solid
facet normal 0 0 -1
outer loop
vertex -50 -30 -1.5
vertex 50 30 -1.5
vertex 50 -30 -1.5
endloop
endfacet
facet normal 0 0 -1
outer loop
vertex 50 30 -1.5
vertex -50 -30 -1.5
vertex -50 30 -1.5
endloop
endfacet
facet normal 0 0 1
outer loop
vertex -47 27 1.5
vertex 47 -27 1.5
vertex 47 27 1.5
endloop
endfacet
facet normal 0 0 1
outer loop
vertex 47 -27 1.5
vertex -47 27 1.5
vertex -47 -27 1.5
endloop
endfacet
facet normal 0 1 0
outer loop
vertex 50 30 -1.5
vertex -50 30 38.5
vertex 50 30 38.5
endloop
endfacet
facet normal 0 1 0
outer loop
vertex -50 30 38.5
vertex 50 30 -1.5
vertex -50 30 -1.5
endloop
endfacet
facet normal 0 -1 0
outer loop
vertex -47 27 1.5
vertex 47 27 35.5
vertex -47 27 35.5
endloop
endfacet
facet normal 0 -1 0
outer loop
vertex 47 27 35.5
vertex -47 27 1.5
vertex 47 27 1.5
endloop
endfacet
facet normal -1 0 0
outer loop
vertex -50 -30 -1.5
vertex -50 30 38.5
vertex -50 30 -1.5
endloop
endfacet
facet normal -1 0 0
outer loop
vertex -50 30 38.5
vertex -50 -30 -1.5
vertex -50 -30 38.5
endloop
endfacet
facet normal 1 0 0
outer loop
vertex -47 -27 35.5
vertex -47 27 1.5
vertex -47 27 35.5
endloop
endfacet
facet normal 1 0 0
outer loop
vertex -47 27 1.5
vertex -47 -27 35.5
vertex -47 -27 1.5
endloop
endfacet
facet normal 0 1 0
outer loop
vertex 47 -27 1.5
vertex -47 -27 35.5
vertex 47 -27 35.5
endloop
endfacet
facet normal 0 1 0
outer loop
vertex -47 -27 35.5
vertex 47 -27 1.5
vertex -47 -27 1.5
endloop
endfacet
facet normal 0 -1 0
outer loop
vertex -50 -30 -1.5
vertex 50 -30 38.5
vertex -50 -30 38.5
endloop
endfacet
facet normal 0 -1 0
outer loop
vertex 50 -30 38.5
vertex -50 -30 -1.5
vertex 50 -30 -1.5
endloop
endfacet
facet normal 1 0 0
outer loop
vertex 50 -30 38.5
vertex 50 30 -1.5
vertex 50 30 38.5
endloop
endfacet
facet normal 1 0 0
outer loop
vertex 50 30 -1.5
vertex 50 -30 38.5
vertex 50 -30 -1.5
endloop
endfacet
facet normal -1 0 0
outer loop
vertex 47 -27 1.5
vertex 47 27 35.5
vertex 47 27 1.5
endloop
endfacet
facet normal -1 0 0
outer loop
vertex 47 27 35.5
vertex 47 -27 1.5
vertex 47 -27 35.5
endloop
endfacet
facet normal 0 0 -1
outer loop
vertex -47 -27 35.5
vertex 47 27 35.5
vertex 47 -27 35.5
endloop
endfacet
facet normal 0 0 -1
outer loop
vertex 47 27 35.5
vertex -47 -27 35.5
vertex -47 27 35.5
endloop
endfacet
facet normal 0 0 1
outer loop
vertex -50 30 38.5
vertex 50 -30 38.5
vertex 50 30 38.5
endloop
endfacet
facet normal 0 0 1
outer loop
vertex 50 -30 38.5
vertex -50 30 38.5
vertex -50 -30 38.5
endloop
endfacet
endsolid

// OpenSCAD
/*
  Box with fingerjoints - Based on earlier version of Finger Joint Box
  http://www.thingiverse.com/thing:448592
  Aaron Ciuffo
  24 December 2015 
*/


//include <../libraries/nuts_and_bolts.scad>
/* [Box Dimensions] */
// Box X dimension
customX = 100;
// Box Y dimension
customY = 60;
// Box Z dimension
customZ = 40;

// Finger & Cut width (sides, bottom) - must be < 1/3 shortest side
customFinger = 10;
// Finger & Cut wdith on lid only - must be < 1/3 shortest X or Y 
customLidFinger = 20;

/* [Layout Option] */
// layout 2D or 3D style - THINGIVERSE CANNOT OUTPUT 2D STLS!
customLayout2D = 0; // [0:3D layout for visualization, 1:2D layout for DXF output]

/* [Hidden] */
customSize = [customX, customY, customZ];
o = .001; // overage for cutting 


// cuts that fall completely inside the edge
module insideCuts(length, finger, cutD, uDiv) {
  numFinger = floor(uDiv/2);
  numCuts = ceil(uDiv/2);

  myCutD = cutD+o; // add an overage to make the cut complete
  // draw rectangles to make slots
  for (i=[0:numCuts-1]) {
    translate([i*finger*2, 0, 0])
      square([finger, myCutD]);
  }
}

module outsideCuts(length, finger, cutD, uDiv) {
  numFinger = ceil(uDiv/2);
  numCuts = floor(uDiv/2);

  myCutD = cutD+o; // add an overage in to make cuts slightly larger


  // calculate the length of the extra long cut at either end
  endCut = (length-uDiv*finger)/2;
  // amount of padding to add to the itterative placement of cuts
  // this is the extra long cut at either end
  padding = endCut+finger;

  square([endCut, myCutD]);

  for (i = [0:numCuts]) {
    if (i < numCuts) {
      translate([i*(finger*2)+padding, 0, 0])
        square([finger, myCutD]);
    } else {
      translate([i*finger*2+padding, 0, 0])
        square([endCut, myCutD]);
    }
  }
}


// Face A (X and Z dimensions)
// front and back face
module faceA(size, finger, lidFinger, material, usableDiv, usableDivLid) {
  uDivX = usableDiv[0];
  uDivZ = usableDiv[2];
  uDivLX = usableDivLid[0];
  uDivLZ = usableDivLid[2];

  boxX = size[0];
  boxY = size[1];
  boxZ = size[2];

  difference() {
    square([boxX, boxZ], center = true);

    // X+/- edge (X axis in openSCAD)
    translate([-uDivLX*lidFinger/2, boxZ/2-material, 0])
      insideCuts(length = boxX, finger = lidFinger, cutD = material, uDiv = uDivLX);

    translate([-uDivX*finger/2, -boxZ/2-o, 0]) // -o to move outside
      insideCuts(length = boxX, finger = finger, cutD = material, uDiv = uDivX);

    // Z+/- edge (Y axis in OpenSCAD)
    translate([boxX/2-material, uDivZ*finger/2, 0]) rotate([0, 0, -90])
      insideCuts(length = boxZ, finger = finger, cutD = material, uDiv = uDivZ);
    translate([-boxX/2-o, uDivZ*finger/2, 0]) rotate([0, 0, -90]) // -o to move outside
      insideCuts(length = boxZ, finger = finger, cutD = material, uDiv = uDivZ);
  } // end difference
}

// Face B (X and Y dimensions)
// lid and base
module faceB(size, finger, lidFinger, material, usableDiv, usableDivLid, lid = false) {
  
  // if this is the lid, use different settings than if it is the base
  uDivX = lid == true ? usableDivLid[0] : usableDiv[0];
  uDivY = lid == true ? usableDivLid[1] : usableDiv[1];
  myFinger = lid == true ? lidFinger : finger;

  //uDivX = finger != lidFinger ? usableDivLid[0] : usableDiv[0];
  //uDivY = finger != lidFinger ? usableDivLid[1] : usableDiv[1];
  //myFinger = finger != lidFinger ? lidFinger : finger;
  
  boxX = size[0];
  boxY = size[1];
  boxZ = size[2];
  
  difference() {
    square([boxX, boxY], center = true);

    // X+/- edge
    translate([-boxX/2, boxY/2-material, 0])
      outsideCuts(length = boxX, finger = myFinger, cutD = material, uDiv = uDivX);
    translate([-boxX/2, -boxY/2-o, 0]) // -o to move the cuts completely outside the face
      outsideCuts(length = boxX, finger = myFinger, cutD = material, uDiv = uDivX);

    // Y+/- edge 
    translate([boxX/2-material, uDivY*myFinger/2, 0]) rotate([0, 0, -90])
      insideCuts(length = boxY, finger = myFinger, cutD = material, uDiv = uDivY);      
    translate([-boxX/2-o, uDivY*myFinger/2, 0]) rotate([0, 0, -90]) // -o to move
      insideCuts(length = boxY, finger = myFinger, cutD = material, uDiv = uDivY);      
  }
  
}

// Face C (Z and Y dimensions)
// left and right sides
module faceC(size, finger, lidFinger, material, usableDiv, usableDivLid) {
  uDivX = usableDiv[0];
  uDivY = usableDiv[1];
  uDivZ = usableDiv[2];
  uDivLX = usableDivLid[0];
  uDivLY = usableDivLid[1];
  uDivLZ = usableDivLid[2];

  boxX = size[0];
  boxY = size[1];
  boxZ = size[2];

  difference() {
    square([boxY, boxZ], center = true);

    //Y+/- edge (X axis in OpenSCAD)
    // lid edge
    translate([-boxY/2, boxZ/2-material, 0])
      outsideCuts(length = boxY, finger = lidFinger, cutD = material, uDiv = uDivLY);
    // bottom edge
    translate([-boxY/2, -boxZ/2-o, 0]) // -o to move outside
      outsideCuts(length = boxY, finger = finger, cutD = material, uDiv = uDivY);

    //Z+/- edge (Y axis in OpenSCAD)
    translate([boxY/2-material, boxZ/2, 0]) rotate([0, 0, -90])
      outsideCuts(length = boxZ, finger = finger, cutD = material, uDiv = uDivZ);
    translate([-boxY/2-o, boxZ/2, 0]) rotate([0, 0, -90]) // -o to move outside
      outsideCuts(length = boxZ, finger = finger, cutD = material, uDiv = uDivZ);
  }

}


module layout2D(size, finger, lidFinger, material, usableDiv, usableDivLid) {
  boxX = size[0];
  boxY = size[1];
  boxZ = size[2];

  //separation of pieces
  separation = 1.5;
  // calculate the most efficient layout
  yDisplace = boxY > boxZ ? boxY : boxZ + separation;

  translate([])
    color("Red")
      faceA(size = size, finger = finger, material = material, lidFinger = lidFinger, 
            usableDiv = usableDiv, usableDivLid = usableDivLid);
  translate([boxX+separation+boxY+separation, 0, 0])
    color("darkred")
      faceA(size = size, finger = finger, material = material, lidFinger = lidFinger, 
            usableDiv = usableDiv, usableDivLid = usableDivLid);

  translate([boxX/2+boxY/2+separation, 0, 0])
    color("blue")
      faceC(size = size, finger = finger, material = material, lidFinger = lidFinger,
            usableDiv = usableDiv, usableDivLid = usableDivLid);
  translate([boxX/2+boxY/2+separation, -yDisplace, 0])
    color("darkblue")
      faceC(size = size, finger = finger, material = material, lidFinger = lidFinger,
            usableDiv = usableDiv, usableDivLid = usableDivLid);


  translate([0, -boxZ/2-yDisplace/2-separation, 0])
    color("lime")
      faceB(size = size, finger = finger, material = material, lidFinger = lidFinger, 
            usableDiv = usableDiv, usableDivLid = usableDivLid, lid = true);

  translate([boxX+separation+boxY+separation, -boxZ/2-yDisplace/2-separation, 0])
    color("green")
      faceB(size = size, finger = finger, material = material, lidFinger = lidFinger, 
            usableDiv = usableDiv, usableDivLid = usableDivLid, lid = false);
}

module layout3D(size, finger, lidFinger, material, usableDiv, usableDivLid, alpha) {
  boxX = size[0];
  boxY = size[1];
  boxZ = size[2];

  // amount to shift to account for thickness of material
  D = material/2;

  // this is the base
  color("green", alpha = alpha)
    translate([])
    linear_extrude(height = material, center = true)
    faceB(size = size, finger = finger, material = material, lidFinger = lidFinger, 
          usableDiv = usableDiv, usableDivLid = usableDivLid, lid = false);

  // this is the "lid"
  color("lime", alpha = alpha)
    translate([0, 0, boxZ-material])
    linear_extrude(height = material, center = true)
    faceB(size = size, finger = finger, material = material, lidFinger = lidFinger, 
          usableDiv = usableDiv, usableDivLid = usableDivLid, lid = true);


  color("red", alpha = alpha)
    translate([0, boxY/2-D, boxZ/2-D])
    rotate([90, 0, 0])
    linear_extrude(height = material, center = true)
    faceA(size = size, finger = finger, material = material, lidFinger = lidFinger, 
         usableDiv = usableDiv, usableDivLid = usableDivLid);
    

  color("darkred", alpha = alpha)
    translate([0, -boxY/2+D, boxZ/2-D])
    rotate([90, 0, 0])
    linear_extrude(height = material, center = true)
    faceA(size = size, finger = finger, material = material, lidFinger = lidFinger, 
         usableDiv = usableDiv, usableDivLid = usableDivLid);
  
  color("blue", alpha = alpha)
    translate([boxX/2-D, 0, boxZ/2-D])
    rotate([90, 0, 90])
    linear_extrude(height = material, center = true)
    faceC(size = size, finger = finger, material = material, lidFinger = lidFinger,
          usableDiv = usableDiv, usableDivLid = usableDivLid);

  color("darkblue", alpha = alpha)
    translate([-boxX/2+D, 0, boxZ/2-D])
    rotate([90, 0, 90])
    linear_extrude(height = material, center = true)
    faceC(size = size, finger = finger, material = material, lidFinger = lidFinger,
          usableDiv = usableDiv, usableDivLid = usableDivLid);

}


module fingerBox(size = [50, 80, 60], finger = 5, 
                lidFinger = 10, material = 3, 2D = true, alpha = .5) {
  boxX = size[0];
  boxY = size[1];
  boxZ = size[2];

  // calculate the maximum number of fingers and cuts possible
  maxDivX = floor(boxX/finger);
  maxDivY = floor(boxY/finger);
  maxDivZ = floor(boxZ/finger);

  // calculate the maximum number of fingers and cuts for the lid
  maxDivLX = floor(boxX/lidFinger);
  maxDivLY = floor(boxY/lidFinger);

  // the usable divisions value must be odd for this layout
  uDivX = (maxDivX%2)==0 ? maxDivX-3 : maxDivX-2;
  uDivY = (maxDivY%2)==0 ? maxDivY-3 : maxDivY-2;
  uDivZ = (maxDivZ%2)==0 ? maxDivZ-3 : maxDivZ-2;
  usableDiv = [uDivX, uDivY, uDivZ];

  uDivLX= (maxDivLX%2)==0 ? maxDivLX-3 : maxDivLX-2;
  uDivLY= (maxDivLY%2)==0 ? maxDivLY-3 : maxDivLY-2;
  usableDivLid = [uDivLX, uDivLY];

  if (2D) {
    layout2D(size = size, finger = finger, lidFinger = lidFinger, material = material,
            usableDiv = usableDiv, usableDivLid = usableDivLid);
  } else {
    layout3D(size = size, finger = finger, lidFinger = lidFinger, material = material,
            usableDiv = usableDiv, usableDivLid = usableDivLid, alpha = alpha);
  }

  
}

//fingerBox(size = [100, 70, 60], finger = 10, lidFinger = 21, 2D = true);

fingerBox(size = customSize, finger = customFinger, lidFinger = customLidFinger, 
          2D = customLayout2D);
